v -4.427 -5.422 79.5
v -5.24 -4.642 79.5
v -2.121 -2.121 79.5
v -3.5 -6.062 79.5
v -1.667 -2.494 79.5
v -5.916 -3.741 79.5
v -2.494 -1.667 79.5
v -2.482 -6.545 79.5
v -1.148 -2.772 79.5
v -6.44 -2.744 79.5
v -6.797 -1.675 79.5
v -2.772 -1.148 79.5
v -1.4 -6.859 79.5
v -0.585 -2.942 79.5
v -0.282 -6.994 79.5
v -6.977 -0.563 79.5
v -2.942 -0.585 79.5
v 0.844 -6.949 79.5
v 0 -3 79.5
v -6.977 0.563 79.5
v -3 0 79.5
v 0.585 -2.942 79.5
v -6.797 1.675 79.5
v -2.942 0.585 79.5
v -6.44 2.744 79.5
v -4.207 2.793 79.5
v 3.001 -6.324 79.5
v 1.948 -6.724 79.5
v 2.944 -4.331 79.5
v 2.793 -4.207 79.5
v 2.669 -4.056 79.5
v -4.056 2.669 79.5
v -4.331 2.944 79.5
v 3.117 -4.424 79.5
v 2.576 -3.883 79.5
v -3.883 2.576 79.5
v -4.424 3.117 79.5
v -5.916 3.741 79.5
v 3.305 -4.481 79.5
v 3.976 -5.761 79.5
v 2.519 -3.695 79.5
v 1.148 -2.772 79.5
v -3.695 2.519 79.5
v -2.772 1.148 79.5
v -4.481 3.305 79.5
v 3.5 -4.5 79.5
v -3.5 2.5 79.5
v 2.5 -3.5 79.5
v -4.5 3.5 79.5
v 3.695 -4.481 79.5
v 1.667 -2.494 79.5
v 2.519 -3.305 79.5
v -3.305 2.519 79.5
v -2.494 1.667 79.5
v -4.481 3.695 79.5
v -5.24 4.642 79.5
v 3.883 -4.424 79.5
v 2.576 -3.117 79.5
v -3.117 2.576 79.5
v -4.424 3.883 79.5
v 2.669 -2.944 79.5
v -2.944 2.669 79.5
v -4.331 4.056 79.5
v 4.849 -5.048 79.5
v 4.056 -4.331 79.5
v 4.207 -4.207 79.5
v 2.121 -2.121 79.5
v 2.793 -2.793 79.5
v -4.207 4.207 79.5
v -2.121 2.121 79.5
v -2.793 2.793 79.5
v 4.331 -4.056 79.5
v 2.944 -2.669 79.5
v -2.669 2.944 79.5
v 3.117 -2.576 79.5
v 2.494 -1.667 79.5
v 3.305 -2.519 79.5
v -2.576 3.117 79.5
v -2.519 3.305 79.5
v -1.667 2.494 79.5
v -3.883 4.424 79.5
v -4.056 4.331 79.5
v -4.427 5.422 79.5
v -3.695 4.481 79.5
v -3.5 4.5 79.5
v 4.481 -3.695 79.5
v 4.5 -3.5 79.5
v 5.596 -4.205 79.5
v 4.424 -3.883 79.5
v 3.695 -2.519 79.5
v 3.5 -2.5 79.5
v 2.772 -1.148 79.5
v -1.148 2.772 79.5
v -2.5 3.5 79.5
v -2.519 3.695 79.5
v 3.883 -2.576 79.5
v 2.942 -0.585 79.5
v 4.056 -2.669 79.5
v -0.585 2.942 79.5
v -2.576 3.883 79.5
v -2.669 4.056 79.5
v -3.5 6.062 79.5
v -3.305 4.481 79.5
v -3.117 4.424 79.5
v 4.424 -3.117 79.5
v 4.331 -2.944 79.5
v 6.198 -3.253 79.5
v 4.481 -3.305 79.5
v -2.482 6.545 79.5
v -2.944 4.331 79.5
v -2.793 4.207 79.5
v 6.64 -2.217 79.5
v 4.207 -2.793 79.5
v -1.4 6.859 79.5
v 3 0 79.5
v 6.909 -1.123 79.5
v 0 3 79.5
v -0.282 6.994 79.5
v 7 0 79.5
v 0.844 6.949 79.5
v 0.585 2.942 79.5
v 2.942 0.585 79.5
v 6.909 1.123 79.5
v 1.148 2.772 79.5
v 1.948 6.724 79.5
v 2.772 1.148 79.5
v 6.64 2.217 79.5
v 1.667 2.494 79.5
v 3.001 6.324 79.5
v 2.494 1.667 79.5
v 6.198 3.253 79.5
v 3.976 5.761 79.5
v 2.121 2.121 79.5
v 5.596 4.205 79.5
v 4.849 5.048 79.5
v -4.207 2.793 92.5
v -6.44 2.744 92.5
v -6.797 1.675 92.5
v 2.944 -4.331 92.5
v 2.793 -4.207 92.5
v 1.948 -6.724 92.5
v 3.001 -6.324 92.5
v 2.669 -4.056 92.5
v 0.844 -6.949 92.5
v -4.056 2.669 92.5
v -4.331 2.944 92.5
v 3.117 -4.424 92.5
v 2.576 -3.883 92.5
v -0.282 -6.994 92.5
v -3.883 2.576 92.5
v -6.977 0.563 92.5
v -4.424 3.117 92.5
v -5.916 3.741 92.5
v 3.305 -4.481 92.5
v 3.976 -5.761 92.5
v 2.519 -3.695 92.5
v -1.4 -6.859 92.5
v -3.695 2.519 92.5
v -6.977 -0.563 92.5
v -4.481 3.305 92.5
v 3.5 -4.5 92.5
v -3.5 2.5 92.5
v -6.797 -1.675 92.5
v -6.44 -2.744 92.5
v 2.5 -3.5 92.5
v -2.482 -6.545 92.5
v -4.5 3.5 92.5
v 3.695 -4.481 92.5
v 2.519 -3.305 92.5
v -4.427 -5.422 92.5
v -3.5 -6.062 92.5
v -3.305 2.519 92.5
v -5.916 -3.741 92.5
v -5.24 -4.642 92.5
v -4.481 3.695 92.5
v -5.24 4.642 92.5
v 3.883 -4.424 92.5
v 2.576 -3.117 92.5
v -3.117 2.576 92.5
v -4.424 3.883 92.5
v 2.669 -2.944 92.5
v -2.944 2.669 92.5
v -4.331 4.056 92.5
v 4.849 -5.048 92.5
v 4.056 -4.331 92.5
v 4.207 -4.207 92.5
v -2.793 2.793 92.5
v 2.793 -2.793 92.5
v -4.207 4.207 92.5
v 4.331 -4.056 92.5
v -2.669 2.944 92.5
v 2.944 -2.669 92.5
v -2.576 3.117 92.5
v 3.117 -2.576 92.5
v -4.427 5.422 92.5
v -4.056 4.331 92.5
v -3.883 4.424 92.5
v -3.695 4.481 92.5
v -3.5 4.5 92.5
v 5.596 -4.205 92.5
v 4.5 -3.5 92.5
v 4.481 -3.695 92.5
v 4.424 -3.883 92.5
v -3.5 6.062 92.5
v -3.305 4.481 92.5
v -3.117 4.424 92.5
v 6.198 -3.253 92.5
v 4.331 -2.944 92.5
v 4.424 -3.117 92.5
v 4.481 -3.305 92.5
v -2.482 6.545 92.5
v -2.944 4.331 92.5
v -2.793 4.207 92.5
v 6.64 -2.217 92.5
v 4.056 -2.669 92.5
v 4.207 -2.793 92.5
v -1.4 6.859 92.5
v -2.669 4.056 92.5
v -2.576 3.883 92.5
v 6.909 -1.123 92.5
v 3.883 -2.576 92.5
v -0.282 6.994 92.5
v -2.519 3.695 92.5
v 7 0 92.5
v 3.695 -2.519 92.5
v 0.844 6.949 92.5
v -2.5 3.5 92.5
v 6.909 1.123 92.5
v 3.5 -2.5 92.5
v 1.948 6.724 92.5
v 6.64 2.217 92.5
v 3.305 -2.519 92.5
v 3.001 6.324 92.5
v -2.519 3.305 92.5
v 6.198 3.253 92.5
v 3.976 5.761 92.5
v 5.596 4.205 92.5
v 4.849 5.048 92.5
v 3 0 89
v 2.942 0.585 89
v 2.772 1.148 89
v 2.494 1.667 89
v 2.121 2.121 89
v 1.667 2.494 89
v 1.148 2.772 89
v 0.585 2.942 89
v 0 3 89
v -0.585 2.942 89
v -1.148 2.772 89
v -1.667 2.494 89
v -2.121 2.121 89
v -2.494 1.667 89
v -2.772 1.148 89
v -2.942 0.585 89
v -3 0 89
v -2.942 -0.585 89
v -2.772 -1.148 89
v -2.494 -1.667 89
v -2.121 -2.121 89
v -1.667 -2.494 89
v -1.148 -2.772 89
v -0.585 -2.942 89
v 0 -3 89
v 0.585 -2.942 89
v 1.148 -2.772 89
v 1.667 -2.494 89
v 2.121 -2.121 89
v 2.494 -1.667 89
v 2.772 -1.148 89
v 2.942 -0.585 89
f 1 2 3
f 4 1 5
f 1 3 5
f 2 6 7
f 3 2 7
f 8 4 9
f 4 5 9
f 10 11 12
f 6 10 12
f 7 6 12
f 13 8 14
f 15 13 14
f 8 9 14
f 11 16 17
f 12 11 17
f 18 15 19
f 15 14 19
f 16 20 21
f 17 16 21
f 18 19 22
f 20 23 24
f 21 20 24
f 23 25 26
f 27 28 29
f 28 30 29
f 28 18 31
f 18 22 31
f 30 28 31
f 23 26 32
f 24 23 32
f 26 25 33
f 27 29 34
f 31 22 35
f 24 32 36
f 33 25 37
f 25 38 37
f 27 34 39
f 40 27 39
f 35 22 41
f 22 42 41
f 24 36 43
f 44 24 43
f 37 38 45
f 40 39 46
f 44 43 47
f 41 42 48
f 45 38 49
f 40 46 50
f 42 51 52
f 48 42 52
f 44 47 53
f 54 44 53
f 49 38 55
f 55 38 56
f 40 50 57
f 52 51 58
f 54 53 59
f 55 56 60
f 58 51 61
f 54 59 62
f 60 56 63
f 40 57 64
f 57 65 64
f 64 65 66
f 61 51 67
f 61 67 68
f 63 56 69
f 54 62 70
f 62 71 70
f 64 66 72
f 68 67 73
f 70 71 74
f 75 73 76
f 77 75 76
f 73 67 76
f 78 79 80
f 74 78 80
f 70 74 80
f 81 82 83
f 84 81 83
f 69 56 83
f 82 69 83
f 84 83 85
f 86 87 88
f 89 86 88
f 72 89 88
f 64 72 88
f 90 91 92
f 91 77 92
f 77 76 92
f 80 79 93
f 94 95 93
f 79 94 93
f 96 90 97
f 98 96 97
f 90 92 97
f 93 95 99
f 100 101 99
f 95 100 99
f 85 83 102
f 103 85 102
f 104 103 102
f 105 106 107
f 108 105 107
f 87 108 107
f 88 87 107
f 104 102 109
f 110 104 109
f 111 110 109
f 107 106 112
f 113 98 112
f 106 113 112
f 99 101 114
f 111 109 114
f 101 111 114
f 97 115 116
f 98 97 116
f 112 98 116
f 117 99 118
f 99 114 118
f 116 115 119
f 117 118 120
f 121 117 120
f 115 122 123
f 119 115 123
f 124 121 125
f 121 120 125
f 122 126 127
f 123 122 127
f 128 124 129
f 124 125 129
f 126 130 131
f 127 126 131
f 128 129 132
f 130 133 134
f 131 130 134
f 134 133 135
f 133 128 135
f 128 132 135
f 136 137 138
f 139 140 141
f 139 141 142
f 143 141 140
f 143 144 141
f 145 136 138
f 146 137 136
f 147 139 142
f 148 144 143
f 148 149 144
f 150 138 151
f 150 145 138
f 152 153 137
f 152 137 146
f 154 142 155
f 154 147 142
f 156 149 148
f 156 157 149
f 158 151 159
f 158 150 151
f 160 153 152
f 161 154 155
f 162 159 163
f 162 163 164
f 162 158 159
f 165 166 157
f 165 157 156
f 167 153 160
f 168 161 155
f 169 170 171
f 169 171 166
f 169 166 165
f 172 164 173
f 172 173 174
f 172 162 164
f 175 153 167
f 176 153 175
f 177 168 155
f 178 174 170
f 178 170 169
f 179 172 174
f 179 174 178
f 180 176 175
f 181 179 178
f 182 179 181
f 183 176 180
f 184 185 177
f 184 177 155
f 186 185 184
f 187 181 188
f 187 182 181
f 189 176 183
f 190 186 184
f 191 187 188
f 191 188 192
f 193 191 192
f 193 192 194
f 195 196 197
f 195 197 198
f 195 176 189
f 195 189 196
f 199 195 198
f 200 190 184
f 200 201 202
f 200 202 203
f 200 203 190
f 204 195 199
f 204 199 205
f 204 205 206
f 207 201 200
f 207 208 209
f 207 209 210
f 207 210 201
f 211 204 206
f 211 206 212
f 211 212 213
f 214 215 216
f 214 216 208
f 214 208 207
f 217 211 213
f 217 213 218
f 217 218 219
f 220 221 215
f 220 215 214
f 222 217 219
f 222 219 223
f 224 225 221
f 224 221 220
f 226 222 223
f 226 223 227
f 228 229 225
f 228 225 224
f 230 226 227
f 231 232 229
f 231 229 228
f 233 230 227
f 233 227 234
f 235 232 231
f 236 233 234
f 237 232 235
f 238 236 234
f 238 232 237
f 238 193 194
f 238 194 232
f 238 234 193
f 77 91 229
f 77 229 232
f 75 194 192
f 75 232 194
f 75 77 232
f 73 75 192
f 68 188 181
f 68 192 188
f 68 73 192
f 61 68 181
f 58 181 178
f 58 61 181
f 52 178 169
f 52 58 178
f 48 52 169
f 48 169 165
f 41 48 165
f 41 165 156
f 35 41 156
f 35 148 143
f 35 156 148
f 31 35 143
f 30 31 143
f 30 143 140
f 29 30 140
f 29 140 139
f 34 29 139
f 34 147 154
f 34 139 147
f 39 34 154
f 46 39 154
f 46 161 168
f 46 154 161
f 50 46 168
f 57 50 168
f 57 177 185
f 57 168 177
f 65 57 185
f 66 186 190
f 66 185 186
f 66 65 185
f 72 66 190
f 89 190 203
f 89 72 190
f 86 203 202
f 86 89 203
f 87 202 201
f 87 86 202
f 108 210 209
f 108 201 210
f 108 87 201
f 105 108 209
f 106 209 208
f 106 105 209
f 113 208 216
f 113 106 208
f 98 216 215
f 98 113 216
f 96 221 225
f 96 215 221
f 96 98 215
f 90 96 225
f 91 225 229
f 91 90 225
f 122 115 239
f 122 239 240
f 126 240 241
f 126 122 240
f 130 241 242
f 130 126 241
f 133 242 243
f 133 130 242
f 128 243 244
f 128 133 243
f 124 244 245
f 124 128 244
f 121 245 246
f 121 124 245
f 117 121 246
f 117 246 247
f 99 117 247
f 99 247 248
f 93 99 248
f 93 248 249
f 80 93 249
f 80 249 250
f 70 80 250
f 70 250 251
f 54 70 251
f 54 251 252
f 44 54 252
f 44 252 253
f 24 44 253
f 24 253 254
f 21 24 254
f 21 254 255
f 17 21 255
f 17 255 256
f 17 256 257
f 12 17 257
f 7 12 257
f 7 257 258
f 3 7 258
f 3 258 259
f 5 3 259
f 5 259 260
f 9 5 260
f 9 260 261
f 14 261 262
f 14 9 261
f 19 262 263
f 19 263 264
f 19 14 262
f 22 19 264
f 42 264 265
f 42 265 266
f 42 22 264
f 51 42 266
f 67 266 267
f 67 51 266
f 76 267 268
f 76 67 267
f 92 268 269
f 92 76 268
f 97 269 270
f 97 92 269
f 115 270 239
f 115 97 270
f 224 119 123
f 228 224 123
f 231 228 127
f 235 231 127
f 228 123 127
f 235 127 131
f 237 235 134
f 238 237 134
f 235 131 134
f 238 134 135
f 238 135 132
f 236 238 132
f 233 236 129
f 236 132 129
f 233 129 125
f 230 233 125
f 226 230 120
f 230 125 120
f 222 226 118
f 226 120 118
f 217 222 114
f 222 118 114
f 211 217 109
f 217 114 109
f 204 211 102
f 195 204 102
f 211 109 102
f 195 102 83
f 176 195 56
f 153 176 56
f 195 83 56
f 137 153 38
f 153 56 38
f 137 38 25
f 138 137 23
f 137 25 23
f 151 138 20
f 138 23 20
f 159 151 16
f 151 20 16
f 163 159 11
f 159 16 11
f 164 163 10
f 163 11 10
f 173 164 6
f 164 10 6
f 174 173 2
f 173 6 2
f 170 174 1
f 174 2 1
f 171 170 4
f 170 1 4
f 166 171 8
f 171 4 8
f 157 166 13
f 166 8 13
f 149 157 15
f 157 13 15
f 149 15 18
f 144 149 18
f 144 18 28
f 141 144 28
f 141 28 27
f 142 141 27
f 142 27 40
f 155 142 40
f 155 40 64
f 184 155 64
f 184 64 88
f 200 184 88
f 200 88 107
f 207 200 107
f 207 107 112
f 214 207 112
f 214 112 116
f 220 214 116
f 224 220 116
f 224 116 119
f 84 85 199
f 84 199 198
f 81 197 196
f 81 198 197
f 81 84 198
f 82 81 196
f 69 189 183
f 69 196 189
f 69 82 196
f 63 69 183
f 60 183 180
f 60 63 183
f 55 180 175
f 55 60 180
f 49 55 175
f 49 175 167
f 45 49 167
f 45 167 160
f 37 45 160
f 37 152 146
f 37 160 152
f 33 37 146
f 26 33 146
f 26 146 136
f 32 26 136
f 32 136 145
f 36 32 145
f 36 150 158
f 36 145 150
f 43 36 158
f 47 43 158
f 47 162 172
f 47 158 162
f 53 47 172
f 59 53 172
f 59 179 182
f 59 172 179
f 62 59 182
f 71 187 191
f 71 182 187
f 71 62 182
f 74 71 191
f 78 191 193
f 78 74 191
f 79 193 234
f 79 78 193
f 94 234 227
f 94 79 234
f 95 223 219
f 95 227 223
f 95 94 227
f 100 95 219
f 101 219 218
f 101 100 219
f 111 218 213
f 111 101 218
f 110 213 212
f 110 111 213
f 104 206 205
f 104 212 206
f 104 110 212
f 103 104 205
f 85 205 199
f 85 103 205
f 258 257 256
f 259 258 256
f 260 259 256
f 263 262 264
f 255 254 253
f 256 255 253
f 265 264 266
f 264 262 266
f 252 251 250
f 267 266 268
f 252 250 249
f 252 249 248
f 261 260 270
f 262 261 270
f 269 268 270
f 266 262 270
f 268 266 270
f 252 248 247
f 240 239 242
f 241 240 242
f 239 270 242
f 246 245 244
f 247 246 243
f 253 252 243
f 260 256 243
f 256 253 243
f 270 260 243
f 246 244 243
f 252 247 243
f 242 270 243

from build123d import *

# Parameters (mm, degrees)
CYLINDER1799_R              = 3
CYLINDER1799_DEPTH          = 20
CYLINDER1788_R              = 1
CYLINDER1788_DEPTH          = 20
CYLINDER1789_R              = 1
CYLINDER1789_DEPTH          = 20
COMPOUND878_PLACEMENT_ANGLE = 90
CYLINDER1941_R              = 7
CYLINDER1941_DEPTH          = 13


with BuildPart() as v_lec1799:
    # Cylinder1799 → Cylinder1799 (new body)
    with BuildSketch(Plane.XY.offset(69)):
        Circle(CYLINDER1799_R)
    extrude(amount=CYLINDER1799_DEPTH)


with BuildPart() as v_lec1788:
    # Cylinder1788 → Cylinder1788 (new body)
    with BuildSketch(Plane(origin=(-3.5, -3.5, 0), x_dir=(1, 0, 0), z_dir=(0, 0, 1))):
        Circle(CYLINDER1788_R)
    extrude(amount=CYLINDER1788_DEPTH)


with BuildPart() as compound878:
    # Cylinder1789 → Cylinder1789 (new body)
    with BuildSketch(Plane(origin=(3.5, 3.5, 0), x_dir=(1, 0, 0), z_dir=(0, 0, 1))):
        Circle(CYLINDER1789_R)
    extrude(amount=CYLINDER1789_DEPTH)

    # Compound878: union Válec1788
    add(v_lec1788.part)


with BuildPart() as compound878_1:
    # Compound878 placement: moved
    add(compound878.part.moved(Location((0, 0, 78))).rotate(Axis((0, 0, 78), (0, 0, 1)), COMPOUND878_PLACEMENT_ANGLE))


with BuildPart() as cut667:
    # Cylinder1941 → Cylinder1941 (new body)
    with BuildSketch(Plane.XY.offset(-27.5)):
        Circle(CYLINDER1941_R)
    extrude(amount=CYLINDER1941_DEPTH)


with BuildPart() as cut667_1:
    # Compound876 placement: moved
    add(cut667.part.moved(Location((0, 0, 107))))

    # Cut714: cut Compound878
    add(compound878_1.part, mode=Mode.SUBTRACT)

    # Cut667: cut Válec1799
    add(v_lec1799.part, mode=Mode.SUBTRACT)


solid = cut667_1.part
